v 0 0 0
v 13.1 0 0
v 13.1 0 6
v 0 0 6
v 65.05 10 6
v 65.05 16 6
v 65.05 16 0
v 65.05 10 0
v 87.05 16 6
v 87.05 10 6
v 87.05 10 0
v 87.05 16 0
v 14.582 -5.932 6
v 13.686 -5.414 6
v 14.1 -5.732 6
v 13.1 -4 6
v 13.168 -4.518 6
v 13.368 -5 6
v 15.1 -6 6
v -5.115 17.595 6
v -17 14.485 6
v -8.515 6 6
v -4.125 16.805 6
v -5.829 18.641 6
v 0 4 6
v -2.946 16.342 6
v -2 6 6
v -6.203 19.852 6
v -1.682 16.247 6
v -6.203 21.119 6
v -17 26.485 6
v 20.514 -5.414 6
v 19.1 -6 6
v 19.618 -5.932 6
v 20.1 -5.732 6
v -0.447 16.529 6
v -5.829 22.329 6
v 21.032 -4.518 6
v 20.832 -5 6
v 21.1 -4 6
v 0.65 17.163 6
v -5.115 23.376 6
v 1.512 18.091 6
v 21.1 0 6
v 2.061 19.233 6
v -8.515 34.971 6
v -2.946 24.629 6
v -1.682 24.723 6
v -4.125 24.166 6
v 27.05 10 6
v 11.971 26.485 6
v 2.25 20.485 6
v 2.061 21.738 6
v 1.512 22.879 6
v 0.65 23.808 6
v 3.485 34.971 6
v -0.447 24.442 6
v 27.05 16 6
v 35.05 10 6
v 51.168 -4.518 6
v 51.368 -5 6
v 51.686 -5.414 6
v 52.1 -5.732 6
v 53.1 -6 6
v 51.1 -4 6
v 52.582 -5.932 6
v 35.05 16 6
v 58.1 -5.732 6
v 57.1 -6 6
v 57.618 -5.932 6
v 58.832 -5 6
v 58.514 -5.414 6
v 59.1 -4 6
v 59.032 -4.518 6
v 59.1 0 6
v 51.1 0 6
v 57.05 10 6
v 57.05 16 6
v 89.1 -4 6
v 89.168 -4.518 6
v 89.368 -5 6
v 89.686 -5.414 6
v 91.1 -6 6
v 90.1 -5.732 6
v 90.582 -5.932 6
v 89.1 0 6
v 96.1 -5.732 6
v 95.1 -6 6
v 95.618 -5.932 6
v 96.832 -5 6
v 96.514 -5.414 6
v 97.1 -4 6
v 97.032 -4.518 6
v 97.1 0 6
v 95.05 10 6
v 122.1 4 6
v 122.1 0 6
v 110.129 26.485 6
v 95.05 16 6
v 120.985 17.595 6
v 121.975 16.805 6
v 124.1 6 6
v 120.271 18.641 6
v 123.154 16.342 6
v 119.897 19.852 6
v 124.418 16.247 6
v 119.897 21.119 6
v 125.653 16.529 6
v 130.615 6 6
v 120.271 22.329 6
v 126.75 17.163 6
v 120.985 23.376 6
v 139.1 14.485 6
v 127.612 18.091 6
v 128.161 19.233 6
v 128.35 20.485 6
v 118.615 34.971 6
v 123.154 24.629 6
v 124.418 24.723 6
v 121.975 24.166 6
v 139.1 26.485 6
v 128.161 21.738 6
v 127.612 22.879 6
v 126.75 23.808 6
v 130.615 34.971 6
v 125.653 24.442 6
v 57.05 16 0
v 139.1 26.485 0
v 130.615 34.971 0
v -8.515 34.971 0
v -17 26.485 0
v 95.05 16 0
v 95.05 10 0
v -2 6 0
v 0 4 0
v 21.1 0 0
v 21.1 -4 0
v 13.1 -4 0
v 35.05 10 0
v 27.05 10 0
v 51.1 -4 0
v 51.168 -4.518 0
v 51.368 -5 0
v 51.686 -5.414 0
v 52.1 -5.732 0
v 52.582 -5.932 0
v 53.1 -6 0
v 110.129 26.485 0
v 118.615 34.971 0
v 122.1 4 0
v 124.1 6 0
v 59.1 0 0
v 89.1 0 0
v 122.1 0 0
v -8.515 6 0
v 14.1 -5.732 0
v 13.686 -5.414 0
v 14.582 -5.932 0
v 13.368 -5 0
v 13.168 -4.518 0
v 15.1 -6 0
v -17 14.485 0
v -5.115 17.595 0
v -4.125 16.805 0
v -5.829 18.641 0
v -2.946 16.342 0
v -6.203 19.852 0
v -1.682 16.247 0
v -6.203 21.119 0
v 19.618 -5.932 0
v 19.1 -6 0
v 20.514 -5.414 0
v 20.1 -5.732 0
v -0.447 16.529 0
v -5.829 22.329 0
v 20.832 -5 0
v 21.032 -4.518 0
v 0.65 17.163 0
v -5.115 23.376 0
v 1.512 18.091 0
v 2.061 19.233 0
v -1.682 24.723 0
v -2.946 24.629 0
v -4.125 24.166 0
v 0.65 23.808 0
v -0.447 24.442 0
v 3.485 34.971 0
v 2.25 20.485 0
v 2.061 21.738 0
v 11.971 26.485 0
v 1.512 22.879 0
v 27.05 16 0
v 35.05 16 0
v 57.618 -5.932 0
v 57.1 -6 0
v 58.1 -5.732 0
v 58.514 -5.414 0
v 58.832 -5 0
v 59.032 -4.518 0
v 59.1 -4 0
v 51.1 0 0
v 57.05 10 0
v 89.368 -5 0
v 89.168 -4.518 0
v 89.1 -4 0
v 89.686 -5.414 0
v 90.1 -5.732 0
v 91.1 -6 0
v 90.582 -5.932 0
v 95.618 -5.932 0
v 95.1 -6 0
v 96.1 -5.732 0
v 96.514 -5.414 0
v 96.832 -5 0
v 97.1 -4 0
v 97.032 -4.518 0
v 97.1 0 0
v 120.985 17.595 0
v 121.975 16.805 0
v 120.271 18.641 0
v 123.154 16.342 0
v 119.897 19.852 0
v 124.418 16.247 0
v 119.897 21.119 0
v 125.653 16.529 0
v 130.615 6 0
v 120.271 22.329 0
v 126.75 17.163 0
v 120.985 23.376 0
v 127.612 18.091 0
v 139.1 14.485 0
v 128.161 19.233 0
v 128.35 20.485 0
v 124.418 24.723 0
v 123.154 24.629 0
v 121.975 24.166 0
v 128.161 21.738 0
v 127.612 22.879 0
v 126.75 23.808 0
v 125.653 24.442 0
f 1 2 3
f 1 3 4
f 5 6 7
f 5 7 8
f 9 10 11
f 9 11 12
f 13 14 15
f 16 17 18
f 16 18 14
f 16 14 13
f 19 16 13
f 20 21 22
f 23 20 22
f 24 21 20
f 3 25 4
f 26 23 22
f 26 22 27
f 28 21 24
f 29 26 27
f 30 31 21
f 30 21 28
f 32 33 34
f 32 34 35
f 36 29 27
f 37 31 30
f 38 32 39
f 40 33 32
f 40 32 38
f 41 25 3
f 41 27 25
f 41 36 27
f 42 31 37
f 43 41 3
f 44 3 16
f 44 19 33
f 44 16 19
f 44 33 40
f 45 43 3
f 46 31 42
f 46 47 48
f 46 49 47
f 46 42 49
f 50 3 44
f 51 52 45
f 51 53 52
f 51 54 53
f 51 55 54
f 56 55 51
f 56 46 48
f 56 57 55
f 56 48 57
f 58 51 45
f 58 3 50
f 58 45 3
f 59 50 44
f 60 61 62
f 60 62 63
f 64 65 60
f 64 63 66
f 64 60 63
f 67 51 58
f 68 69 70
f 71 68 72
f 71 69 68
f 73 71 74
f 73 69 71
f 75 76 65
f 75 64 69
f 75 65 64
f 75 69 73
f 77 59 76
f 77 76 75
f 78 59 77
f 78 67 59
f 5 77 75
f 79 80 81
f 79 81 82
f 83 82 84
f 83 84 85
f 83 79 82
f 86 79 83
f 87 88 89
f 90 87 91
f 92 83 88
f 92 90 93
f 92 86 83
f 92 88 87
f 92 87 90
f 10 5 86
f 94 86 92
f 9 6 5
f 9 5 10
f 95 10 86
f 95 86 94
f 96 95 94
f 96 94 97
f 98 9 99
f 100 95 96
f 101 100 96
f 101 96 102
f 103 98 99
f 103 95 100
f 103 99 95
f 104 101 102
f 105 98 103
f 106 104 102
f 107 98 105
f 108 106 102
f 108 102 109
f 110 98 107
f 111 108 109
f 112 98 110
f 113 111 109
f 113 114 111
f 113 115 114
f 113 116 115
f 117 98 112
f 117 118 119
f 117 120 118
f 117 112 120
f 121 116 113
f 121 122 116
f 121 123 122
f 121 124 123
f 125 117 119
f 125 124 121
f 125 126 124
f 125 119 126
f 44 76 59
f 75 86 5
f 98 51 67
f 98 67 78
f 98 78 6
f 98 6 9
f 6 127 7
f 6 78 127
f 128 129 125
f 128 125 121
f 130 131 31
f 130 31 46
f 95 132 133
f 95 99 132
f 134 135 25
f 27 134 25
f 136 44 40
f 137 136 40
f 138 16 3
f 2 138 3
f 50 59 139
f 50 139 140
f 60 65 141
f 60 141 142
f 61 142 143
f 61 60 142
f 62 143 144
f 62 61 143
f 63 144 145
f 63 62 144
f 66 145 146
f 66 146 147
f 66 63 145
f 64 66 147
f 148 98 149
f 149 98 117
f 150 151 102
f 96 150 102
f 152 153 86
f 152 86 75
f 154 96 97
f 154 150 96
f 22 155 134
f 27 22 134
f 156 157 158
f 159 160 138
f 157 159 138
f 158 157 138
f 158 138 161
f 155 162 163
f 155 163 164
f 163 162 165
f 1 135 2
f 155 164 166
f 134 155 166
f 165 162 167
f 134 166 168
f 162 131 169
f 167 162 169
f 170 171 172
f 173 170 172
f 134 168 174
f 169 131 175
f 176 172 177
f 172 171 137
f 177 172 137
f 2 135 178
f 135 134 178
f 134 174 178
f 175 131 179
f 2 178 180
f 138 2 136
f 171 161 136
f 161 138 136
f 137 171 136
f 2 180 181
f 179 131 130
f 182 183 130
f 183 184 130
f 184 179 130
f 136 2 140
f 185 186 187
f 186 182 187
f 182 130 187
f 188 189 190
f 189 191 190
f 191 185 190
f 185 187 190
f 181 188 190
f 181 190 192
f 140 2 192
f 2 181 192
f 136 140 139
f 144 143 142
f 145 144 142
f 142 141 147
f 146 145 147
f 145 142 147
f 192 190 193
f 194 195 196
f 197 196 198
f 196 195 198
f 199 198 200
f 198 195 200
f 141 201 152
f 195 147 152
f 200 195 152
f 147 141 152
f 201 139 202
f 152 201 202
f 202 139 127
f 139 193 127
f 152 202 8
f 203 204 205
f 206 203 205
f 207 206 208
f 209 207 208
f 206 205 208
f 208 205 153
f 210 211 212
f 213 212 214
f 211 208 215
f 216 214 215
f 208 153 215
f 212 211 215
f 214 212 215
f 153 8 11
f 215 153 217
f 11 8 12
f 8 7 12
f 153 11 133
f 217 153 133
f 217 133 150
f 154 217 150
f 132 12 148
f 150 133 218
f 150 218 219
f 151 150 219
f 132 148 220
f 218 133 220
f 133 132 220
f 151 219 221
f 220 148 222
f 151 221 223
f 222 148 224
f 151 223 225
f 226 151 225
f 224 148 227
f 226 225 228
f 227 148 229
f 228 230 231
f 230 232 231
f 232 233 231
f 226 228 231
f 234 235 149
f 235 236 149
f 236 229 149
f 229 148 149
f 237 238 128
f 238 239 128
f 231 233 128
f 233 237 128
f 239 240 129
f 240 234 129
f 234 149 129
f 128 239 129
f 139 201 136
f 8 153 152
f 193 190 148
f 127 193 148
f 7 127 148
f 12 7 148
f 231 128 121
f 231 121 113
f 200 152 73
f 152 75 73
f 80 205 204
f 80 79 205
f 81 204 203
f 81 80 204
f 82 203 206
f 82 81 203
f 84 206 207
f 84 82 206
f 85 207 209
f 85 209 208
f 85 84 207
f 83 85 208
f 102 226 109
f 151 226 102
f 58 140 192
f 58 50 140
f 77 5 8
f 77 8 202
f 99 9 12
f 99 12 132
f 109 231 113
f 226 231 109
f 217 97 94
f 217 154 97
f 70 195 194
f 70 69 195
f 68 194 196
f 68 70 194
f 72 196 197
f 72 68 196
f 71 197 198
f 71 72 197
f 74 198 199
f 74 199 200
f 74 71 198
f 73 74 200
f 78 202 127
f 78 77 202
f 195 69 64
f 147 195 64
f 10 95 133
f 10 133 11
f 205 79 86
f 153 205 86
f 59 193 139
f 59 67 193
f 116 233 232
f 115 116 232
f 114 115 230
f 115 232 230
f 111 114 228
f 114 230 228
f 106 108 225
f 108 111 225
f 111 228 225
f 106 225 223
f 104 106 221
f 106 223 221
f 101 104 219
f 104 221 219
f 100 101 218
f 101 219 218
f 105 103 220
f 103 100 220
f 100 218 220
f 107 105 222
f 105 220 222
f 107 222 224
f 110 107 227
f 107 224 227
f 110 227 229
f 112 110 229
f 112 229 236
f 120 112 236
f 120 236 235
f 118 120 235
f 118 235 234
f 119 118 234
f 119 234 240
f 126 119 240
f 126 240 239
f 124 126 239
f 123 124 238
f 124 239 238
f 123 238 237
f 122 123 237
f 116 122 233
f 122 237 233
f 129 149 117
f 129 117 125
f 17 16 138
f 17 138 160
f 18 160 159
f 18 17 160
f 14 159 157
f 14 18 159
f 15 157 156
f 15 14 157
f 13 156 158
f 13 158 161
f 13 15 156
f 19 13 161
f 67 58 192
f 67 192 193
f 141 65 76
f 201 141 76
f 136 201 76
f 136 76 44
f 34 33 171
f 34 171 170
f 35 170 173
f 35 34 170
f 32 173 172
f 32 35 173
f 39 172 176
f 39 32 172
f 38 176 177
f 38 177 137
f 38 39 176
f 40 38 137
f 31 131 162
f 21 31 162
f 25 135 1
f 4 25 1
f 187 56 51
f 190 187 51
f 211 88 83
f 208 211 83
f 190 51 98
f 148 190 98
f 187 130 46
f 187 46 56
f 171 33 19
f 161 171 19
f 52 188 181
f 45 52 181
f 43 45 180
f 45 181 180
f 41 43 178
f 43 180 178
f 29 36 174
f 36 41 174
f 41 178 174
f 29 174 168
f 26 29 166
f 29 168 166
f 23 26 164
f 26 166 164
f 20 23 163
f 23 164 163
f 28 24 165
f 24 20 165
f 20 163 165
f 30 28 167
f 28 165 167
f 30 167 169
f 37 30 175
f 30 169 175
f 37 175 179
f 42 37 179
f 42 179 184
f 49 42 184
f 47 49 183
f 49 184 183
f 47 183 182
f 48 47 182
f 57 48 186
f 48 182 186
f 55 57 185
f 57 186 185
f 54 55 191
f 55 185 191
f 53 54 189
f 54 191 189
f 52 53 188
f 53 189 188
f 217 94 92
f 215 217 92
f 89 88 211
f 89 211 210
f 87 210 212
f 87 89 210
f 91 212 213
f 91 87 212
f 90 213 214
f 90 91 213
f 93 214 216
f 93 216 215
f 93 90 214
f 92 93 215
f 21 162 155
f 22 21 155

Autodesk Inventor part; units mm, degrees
ref_plane "YZ Plane" through (0, 0, 0) normal (1, 0, 0) x (0, 1, 0)
ref_plane "XZ Plane" through (0, 0, 0) normal (0, 1, 0) x (-1, 0, 0)
ref_plane "XY Plane" through (0, 0, 0) normal (0, 0, 1) x (1, 0, 0)
sketch "Sketch1" plane through (0, 0, 0) normal (0, 0, 1) x (1, 0, 0)
  circle A0 centre (-2, 20.4853) radius 4.25
  circle A1 centre (124.1, 20.4853) radius 4.25
  line L0 (-17, 26.4853) -> (-17, 14.4853)
  line L1 (-17, 26.4853) -> (-8.5147, 34.9706)
  line L2 (-17, 14.4853) -> (-8.5147, 6)
  line L3 (-8.5147, 34.9706) -> (130.6147, 34.9706)
  line L4 (130.6147, 34.9706) -> (139.1, 26.4853)
  line L5 (139.1, 26.4853) -> (139.1, 14.4853)
  line L6 (139.1, 14.4853) -> (130.6147, 6)
  circle A2 centre (-2, 20.4853) radius 13 construction
  circle A3 centre (-2, 20.4853) radius 17 construction
  line L7 (-8.5147, 6) -> (0, 6)
  line L8 (0, 6) -> (0, 0)
  line L9 (130.6147, 6) -> (122.1, 6)
  line L10 (122.1, 6) -> (122.1, 0)
  line L11 (122.1, 0) -> (0, 0)
  point P0 (0, 0)
  point P1 (-17, 20.4853)
  dimension "d0" = 8.5
  dimension "d1" = 126.1
  dimension "d2" = 45
  dimension "d3" = 12
  dimension "d4" = 26
  dimension "d5" = 34
  dimension "d6" = 15
  dimension "d7" = 6
  dimension "d10" = 15
  dimension "d18" = 2
extrude "Extrusion1" add sketch "Sketch1" along normal blind 6
sketch "Sketch2" plane through (0, 0, 6) normal (0, 0, 1) x (1, 0, 0)
  line L0 (130.6147, 34.9706) -> (-8.5147, 34.9706) projected
  line L1 (-8.5147, 34.9706) -> (-17, 26.4853) projected
  line L2 (3.4853, 34.9706) -> (11.9706, 26.4853)
  line L3 (11.9706, 26.4853) -> (110.1294, 26.4853)
  line L4 (110.1294, 26.4853) -> (118.6147, 34.9706)
  point P0 (-17, 14.4853)
  dimension "d13" = 12
  dimension "d14" = 12
  dimension "d15" = 12
extrude "Extrusion2" cut sketch "Sketch2" against normal blind 6
sketch "Sketch3" plane through (0, 0, 6) normal (0, 0, 1) x (1, 0, 0)
  line L0 (0, 0) -> (122.1, 0) projected
  line L1 (110.1294, 26.4853) -> (11.9706, 26.4853) projected
  line L2 (57.05, 16) -> (65.05, 16)
  line L3 (65.05, 16) -> (65.05, 10)
  line L4 (65.05, 10) -> (57.05, 10)
  line L5 (57.05, 10) -> (57.05, 16)
  line L6 (27.05, 16) -> (35.05, 16)
  line L7 (35.05, 16) -> (35.05, 10)
  line L8 (35.05, 10) -> (27.05, 10)
  line L9 (27.05, 10) -> (27.05, 16)
  line L10 (87.05, 16) -> (95.05, 16)
  line L11 (95.05, 16) -> (95.05, 10)
  line L12 (95.05, 10) -> (87.05, 10)
  line L13 (87.05, 10) -> (87.05, 16)
  point P0 (61.05, 16)
  point P1 (61.05, 26.4853)
  dimension "d20" = 8
  dimension "d21" = 6
  dimension "d22" = 8
  dimension "d23" = 8
  dimension "d24" = 10
  dimension "d25" = 22
  dimension "d26" = 22
extrude "Extrusion3" cut sketch "Sketch3" against normal through all
sketch "Sketch4" plane through (0, 0, 6) normal (0, 0, 1) x (1, 0, 0)
  line L0 (0, 0) -> (122.1, 0) projected
  line L1 (13.1, 0) -> (21.1, 0)
  line L2 (21.1, 0) -> (21.1, -4)
  line L3 (19.1, -6) -> (15.1, -6)
  line L4 (13.1, -4) -> (13.1, 0)
  line L5 (51.1, 0) -> (59.1, 0)
  line L6 (59.1, 0) -> (59.1, -4)
  line L7 (57.1, -6) -> (53.1, -6)
  line L8 (51.1, -4) -> (51.1, 0)
  line L9 (89.1, 0) -> (97.1, 0)
  line L10 (97.1, 0) -> (97.1, -4)
  line L11 (95.1, -6) -> (91.1, -6)
  line L12 (89.1, -4) -> (89.1, 0)
  arc A0 (13.1, -4) -> (15.1, -6) centre (15.1, -4) ccw
  arc A1 (19.1, -6) -> (21.1, -4) centre (19.1, -4) ccw
  arc A2 (51.1, -4) -> (53.1, -6) centre (53.1, -4) ccw
  arc A3 (57.1, -6) -> (59.1, -4) centre (57.1, -4) ccw
  arc A4 (89.1, -4) -> (91.1, -6) centre (91.1, -4) ccw
  arc A5 (95.1, -6) -> (97.1, -4) centre (95.1, -4) ccw
  dimension "d29" = 2
  dimension "d30" = 8
  dimension "d31" = 8
  dimension "d32" = 8
  dimension "d33" = 6
  dimension "d34" = 6
  dimension "d35" = 6
  dimension "d36" = 25
  dimension "d37" = 30
  dimension "d38" = 30
extrude "Extrusion4" add sketch "Sketch4" against normal blind 6
chamfer "Chamfer1" distance 2 angle 45 2 edges at (0, 6, 3) (122.1, 6, 3)
equation "\"d14\" = d13"
equation "\"d15\" = d14"
equation "\"d26\" = d25"
properties part number "rope_mount_b"
